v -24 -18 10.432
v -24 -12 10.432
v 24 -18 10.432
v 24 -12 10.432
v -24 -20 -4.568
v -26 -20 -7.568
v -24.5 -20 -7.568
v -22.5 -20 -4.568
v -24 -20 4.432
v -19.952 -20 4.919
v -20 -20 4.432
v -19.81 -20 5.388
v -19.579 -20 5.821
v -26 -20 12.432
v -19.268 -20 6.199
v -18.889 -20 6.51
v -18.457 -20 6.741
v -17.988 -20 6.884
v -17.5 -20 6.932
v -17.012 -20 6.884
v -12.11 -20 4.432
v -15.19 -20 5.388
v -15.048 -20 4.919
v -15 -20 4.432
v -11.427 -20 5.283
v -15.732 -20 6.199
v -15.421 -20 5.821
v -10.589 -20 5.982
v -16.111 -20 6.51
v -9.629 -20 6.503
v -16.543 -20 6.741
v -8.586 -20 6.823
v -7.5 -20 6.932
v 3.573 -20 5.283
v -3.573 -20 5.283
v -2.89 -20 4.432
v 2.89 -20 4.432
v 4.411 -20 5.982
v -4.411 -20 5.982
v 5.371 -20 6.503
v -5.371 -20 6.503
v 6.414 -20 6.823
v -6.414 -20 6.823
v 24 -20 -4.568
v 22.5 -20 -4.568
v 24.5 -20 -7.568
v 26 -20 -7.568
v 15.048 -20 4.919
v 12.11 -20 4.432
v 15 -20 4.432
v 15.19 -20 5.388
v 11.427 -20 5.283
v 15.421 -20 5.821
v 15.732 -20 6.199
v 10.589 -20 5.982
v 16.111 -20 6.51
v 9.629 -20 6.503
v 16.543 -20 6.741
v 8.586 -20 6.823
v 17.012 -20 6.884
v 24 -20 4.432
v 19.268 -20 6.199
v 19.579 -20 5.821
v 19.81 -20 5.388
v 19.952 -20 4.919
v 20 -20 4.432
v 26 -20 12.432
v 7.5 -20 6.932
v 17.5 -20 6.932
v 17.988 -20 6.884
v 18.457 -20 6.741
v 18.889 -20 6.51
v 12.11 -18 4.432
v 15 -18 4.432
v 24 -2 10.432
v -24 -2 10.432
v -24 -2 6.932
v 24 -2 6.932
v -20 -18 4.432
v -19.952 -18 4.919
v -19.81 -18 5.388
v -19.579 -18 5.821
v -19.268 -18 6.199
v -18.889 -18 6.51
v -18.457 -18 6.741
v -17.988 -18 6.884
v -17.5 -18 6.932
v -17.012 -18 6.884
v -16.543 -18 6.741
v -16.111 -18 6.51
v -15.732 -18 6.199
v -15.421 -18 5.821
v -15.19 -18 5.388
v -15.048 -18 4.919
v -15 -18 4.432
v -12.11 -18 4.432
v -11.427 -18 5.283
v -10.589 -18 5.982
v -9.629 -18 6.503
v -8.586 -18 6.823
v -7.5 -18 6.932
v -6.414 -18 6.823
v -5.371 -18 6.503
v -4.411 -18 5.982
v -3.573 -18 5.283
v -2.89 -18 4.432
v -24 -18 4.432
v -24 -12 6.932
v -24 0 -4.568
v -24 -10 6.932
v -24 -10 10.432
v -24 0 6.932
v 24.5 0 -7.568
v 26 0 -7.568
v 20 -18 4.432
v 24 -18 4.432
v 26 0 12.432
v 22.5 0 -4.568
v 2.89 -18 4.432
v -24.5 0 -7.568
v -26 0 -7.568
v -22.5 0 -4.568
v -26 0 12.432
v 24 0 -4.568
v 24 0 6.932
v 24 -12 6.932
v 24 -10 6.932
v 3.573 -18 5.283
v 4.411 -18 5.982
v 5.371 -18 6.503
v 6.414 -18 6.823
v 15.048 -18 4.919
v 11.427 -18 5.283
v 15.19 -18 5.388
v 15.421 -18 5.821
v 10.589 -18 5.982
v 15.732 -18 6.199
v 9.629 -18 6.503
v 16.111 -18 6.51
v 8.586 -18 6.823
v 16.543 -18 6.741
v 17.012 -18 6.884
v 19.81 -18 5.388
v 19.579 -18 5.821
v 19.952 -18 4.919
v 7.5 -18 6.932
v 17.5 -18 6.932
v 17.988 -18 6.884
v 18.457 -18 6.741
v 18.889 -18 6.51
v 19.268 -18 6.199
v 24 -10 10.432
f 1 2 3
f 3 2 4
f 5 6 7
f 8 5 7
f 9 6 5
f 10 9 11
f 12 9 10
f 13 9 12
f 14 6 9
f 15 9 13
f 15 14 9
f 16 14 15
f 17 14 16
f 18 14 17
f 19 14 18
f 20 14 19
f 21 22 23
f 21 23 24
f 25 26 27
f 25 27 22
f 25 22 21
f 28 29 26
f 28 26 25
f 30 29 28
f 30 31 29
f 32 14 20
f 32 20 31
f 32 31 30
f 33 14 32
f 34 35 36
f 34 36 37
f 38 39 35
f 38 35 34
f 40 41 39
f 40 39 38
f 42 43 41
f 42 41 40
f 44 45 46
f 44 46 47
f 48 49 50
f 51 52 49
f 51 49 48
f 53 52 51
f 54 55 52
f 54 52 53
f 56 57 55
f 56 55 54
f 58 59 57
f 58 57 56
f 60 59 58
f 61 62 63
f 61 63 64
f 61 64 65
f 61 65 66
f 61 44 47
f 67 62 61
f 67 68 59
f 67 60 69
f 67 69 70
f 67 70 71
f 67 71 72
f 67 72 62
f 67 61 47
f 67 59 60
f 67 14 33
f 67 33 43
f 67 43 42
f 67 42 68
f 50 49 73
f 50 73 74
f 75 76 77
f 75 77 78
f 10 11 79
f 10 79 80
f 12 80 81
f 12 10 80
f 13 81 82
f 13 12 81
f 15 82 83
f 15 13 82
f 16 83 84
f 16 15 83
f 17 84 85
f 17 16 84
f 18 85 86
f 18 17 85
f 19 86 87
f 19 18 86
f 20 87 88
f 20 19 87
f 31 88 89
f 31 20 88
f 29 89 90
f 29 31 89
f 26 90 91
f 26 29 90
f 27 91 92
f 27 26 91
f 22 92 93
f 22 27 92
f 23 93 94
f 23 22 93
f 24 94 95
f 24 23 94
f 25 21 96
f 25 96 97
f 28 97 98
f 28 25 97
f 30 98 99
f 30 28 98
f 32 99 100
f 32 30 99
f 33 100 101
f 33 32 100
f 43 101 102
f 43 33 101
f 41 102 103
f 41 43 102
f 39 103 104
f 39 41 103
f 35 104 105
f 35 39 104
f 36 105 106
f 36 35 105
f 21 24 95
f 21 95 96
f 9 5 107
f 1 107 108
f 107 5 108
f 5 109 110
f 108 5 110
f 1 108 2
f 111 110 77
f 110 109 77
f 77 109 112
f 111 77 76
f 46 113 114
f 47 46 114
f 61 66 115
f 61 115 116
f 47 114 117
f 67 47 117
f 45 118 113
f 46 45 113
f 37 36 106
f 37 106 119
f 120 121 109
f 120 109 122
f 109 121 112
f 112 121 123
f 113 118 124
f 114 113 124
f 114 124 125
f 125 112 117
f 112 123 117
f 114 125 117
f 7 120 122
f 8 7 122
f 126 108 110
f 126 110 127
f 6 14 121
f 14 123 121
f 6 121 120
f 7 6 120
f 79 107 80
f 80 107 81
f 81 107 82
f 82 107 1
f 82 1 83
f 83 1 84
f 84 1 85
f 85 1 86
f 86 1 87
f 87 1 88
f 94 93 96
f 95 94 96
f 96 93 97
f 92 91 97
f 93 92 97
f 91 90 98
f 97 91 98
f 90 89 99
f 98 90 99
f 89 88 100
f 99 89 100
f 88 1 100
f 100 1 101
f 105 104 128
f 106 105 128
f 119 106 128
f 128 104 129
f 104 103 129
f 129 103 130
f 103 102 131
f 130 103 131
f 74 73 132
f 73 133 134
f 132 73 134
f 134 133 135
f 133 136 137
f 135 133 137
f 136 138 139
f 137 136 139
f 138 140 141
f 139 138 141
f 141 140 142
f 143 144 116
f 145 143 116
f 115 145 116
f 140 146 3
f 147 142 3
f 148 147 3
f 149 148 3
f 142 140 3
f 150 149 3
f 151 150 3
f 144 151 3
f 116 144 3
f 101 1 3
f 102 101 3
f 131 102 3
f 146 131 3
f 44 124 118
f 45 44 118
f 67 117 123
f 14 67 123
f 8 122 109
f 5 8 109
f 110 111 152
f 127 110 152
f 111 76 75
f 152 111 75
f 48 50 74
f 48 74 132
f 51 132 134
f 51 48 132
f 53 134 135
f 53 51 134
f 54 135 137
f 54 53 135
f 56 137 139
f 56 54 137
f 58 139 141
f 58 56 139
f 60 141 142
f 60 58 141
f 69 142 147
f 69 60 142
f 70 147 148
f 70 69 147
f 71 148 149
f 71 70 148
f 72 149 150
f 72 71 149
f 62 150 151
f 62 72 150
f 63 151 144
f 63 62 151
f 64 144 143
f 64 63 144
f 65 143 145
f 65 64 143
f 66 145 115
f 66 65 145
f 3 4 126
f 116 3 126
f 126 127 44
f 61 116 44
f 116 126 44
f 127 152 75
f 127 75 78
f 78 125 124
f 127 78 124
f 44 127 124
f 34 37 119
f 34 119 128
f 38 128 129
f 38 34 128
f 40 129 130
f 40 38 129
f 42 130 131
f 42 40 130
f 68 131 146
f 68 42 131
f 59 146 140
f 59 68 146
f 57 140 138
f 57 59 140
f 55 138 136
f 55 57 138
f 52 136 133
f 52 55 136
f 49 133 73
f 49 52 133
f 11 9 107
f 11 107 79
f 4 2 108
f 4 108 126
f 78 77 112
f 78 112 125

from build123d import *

# Parameters (mm, degrees)
F1_DEPTH = 20
F2_W     = 48
F2_H     = 2
F3_DEPTH = 3.5
F5_DEPTH = 2


with BuildPart() as f1:
    # F0 (on Front) → F1 (new body)
    with BuildSketch(Plane.XZ):
        Polygon((26, -7.568409), (26, 12.431591), (-26, 12.431591), (-26, -7.568409), (-24.5, -7.568409), (-22.5, -4.568409), (-24, -4.568409), (-24, 10.431591), (24, 10.431591), (24, -4.568409), (22.5, -4.568409), (24.5, -7.568409), align=None)
    extrude(amount=F1_DEPTH)

    # F2 (on face) → F3 (join)
    with BuildSketch(Plane(origin=(0, 0, 10.431591), x_dir=(1, 0, 0), z_dir=(0, 0, -1))):
        with Locations((0, 1)):
            Rectangle(F2_W, F2_H)
        with Locations((0, 11)):
            Rectangle(F2_W, F2_H)
    extrude(amount=F3_DEPTH)

    # F4 (on face) → F5 (join)
    with BuildSketch(Plane.XZ.offset(20)):
        with BuildLine():
            Line((26, 12.431591), (-26, 12.431591))
            Line((-26, 12.431591), (-26, 4.431591))
            Line((-26, 4.431591), (-20, 4.431591))
            ThreePointArc((-20, 4.431591), (-17.5, 6.931591), (-15, 4.431591))
            Line((-15, 4.431591), (-12.109772, 4.431591))
            ThreePointArc((-12.109772, 4.431591), (-7.5, 6.931591), (-2.890228, 4.431591))
            Line((-2.890228, 4.431591), (2.890228, 4.431591))
            ThreePointArc((2.890228, 4.431591), (7.5, 6.931591), (12.109772, 4.431591))
            Line((12.109772, 4.431591), (15, 4.431591))
            ThreePointArc((15, 4.431591), (17.5, 6.931591), (20, 4.431591))
            Line((20, 4.431591), (26, 4.431591))
            Line((26, 4.431591), (26, 12.431591))
        make_face()
    extrude(amount=-F5_DEPTH)


solid = f1.part
